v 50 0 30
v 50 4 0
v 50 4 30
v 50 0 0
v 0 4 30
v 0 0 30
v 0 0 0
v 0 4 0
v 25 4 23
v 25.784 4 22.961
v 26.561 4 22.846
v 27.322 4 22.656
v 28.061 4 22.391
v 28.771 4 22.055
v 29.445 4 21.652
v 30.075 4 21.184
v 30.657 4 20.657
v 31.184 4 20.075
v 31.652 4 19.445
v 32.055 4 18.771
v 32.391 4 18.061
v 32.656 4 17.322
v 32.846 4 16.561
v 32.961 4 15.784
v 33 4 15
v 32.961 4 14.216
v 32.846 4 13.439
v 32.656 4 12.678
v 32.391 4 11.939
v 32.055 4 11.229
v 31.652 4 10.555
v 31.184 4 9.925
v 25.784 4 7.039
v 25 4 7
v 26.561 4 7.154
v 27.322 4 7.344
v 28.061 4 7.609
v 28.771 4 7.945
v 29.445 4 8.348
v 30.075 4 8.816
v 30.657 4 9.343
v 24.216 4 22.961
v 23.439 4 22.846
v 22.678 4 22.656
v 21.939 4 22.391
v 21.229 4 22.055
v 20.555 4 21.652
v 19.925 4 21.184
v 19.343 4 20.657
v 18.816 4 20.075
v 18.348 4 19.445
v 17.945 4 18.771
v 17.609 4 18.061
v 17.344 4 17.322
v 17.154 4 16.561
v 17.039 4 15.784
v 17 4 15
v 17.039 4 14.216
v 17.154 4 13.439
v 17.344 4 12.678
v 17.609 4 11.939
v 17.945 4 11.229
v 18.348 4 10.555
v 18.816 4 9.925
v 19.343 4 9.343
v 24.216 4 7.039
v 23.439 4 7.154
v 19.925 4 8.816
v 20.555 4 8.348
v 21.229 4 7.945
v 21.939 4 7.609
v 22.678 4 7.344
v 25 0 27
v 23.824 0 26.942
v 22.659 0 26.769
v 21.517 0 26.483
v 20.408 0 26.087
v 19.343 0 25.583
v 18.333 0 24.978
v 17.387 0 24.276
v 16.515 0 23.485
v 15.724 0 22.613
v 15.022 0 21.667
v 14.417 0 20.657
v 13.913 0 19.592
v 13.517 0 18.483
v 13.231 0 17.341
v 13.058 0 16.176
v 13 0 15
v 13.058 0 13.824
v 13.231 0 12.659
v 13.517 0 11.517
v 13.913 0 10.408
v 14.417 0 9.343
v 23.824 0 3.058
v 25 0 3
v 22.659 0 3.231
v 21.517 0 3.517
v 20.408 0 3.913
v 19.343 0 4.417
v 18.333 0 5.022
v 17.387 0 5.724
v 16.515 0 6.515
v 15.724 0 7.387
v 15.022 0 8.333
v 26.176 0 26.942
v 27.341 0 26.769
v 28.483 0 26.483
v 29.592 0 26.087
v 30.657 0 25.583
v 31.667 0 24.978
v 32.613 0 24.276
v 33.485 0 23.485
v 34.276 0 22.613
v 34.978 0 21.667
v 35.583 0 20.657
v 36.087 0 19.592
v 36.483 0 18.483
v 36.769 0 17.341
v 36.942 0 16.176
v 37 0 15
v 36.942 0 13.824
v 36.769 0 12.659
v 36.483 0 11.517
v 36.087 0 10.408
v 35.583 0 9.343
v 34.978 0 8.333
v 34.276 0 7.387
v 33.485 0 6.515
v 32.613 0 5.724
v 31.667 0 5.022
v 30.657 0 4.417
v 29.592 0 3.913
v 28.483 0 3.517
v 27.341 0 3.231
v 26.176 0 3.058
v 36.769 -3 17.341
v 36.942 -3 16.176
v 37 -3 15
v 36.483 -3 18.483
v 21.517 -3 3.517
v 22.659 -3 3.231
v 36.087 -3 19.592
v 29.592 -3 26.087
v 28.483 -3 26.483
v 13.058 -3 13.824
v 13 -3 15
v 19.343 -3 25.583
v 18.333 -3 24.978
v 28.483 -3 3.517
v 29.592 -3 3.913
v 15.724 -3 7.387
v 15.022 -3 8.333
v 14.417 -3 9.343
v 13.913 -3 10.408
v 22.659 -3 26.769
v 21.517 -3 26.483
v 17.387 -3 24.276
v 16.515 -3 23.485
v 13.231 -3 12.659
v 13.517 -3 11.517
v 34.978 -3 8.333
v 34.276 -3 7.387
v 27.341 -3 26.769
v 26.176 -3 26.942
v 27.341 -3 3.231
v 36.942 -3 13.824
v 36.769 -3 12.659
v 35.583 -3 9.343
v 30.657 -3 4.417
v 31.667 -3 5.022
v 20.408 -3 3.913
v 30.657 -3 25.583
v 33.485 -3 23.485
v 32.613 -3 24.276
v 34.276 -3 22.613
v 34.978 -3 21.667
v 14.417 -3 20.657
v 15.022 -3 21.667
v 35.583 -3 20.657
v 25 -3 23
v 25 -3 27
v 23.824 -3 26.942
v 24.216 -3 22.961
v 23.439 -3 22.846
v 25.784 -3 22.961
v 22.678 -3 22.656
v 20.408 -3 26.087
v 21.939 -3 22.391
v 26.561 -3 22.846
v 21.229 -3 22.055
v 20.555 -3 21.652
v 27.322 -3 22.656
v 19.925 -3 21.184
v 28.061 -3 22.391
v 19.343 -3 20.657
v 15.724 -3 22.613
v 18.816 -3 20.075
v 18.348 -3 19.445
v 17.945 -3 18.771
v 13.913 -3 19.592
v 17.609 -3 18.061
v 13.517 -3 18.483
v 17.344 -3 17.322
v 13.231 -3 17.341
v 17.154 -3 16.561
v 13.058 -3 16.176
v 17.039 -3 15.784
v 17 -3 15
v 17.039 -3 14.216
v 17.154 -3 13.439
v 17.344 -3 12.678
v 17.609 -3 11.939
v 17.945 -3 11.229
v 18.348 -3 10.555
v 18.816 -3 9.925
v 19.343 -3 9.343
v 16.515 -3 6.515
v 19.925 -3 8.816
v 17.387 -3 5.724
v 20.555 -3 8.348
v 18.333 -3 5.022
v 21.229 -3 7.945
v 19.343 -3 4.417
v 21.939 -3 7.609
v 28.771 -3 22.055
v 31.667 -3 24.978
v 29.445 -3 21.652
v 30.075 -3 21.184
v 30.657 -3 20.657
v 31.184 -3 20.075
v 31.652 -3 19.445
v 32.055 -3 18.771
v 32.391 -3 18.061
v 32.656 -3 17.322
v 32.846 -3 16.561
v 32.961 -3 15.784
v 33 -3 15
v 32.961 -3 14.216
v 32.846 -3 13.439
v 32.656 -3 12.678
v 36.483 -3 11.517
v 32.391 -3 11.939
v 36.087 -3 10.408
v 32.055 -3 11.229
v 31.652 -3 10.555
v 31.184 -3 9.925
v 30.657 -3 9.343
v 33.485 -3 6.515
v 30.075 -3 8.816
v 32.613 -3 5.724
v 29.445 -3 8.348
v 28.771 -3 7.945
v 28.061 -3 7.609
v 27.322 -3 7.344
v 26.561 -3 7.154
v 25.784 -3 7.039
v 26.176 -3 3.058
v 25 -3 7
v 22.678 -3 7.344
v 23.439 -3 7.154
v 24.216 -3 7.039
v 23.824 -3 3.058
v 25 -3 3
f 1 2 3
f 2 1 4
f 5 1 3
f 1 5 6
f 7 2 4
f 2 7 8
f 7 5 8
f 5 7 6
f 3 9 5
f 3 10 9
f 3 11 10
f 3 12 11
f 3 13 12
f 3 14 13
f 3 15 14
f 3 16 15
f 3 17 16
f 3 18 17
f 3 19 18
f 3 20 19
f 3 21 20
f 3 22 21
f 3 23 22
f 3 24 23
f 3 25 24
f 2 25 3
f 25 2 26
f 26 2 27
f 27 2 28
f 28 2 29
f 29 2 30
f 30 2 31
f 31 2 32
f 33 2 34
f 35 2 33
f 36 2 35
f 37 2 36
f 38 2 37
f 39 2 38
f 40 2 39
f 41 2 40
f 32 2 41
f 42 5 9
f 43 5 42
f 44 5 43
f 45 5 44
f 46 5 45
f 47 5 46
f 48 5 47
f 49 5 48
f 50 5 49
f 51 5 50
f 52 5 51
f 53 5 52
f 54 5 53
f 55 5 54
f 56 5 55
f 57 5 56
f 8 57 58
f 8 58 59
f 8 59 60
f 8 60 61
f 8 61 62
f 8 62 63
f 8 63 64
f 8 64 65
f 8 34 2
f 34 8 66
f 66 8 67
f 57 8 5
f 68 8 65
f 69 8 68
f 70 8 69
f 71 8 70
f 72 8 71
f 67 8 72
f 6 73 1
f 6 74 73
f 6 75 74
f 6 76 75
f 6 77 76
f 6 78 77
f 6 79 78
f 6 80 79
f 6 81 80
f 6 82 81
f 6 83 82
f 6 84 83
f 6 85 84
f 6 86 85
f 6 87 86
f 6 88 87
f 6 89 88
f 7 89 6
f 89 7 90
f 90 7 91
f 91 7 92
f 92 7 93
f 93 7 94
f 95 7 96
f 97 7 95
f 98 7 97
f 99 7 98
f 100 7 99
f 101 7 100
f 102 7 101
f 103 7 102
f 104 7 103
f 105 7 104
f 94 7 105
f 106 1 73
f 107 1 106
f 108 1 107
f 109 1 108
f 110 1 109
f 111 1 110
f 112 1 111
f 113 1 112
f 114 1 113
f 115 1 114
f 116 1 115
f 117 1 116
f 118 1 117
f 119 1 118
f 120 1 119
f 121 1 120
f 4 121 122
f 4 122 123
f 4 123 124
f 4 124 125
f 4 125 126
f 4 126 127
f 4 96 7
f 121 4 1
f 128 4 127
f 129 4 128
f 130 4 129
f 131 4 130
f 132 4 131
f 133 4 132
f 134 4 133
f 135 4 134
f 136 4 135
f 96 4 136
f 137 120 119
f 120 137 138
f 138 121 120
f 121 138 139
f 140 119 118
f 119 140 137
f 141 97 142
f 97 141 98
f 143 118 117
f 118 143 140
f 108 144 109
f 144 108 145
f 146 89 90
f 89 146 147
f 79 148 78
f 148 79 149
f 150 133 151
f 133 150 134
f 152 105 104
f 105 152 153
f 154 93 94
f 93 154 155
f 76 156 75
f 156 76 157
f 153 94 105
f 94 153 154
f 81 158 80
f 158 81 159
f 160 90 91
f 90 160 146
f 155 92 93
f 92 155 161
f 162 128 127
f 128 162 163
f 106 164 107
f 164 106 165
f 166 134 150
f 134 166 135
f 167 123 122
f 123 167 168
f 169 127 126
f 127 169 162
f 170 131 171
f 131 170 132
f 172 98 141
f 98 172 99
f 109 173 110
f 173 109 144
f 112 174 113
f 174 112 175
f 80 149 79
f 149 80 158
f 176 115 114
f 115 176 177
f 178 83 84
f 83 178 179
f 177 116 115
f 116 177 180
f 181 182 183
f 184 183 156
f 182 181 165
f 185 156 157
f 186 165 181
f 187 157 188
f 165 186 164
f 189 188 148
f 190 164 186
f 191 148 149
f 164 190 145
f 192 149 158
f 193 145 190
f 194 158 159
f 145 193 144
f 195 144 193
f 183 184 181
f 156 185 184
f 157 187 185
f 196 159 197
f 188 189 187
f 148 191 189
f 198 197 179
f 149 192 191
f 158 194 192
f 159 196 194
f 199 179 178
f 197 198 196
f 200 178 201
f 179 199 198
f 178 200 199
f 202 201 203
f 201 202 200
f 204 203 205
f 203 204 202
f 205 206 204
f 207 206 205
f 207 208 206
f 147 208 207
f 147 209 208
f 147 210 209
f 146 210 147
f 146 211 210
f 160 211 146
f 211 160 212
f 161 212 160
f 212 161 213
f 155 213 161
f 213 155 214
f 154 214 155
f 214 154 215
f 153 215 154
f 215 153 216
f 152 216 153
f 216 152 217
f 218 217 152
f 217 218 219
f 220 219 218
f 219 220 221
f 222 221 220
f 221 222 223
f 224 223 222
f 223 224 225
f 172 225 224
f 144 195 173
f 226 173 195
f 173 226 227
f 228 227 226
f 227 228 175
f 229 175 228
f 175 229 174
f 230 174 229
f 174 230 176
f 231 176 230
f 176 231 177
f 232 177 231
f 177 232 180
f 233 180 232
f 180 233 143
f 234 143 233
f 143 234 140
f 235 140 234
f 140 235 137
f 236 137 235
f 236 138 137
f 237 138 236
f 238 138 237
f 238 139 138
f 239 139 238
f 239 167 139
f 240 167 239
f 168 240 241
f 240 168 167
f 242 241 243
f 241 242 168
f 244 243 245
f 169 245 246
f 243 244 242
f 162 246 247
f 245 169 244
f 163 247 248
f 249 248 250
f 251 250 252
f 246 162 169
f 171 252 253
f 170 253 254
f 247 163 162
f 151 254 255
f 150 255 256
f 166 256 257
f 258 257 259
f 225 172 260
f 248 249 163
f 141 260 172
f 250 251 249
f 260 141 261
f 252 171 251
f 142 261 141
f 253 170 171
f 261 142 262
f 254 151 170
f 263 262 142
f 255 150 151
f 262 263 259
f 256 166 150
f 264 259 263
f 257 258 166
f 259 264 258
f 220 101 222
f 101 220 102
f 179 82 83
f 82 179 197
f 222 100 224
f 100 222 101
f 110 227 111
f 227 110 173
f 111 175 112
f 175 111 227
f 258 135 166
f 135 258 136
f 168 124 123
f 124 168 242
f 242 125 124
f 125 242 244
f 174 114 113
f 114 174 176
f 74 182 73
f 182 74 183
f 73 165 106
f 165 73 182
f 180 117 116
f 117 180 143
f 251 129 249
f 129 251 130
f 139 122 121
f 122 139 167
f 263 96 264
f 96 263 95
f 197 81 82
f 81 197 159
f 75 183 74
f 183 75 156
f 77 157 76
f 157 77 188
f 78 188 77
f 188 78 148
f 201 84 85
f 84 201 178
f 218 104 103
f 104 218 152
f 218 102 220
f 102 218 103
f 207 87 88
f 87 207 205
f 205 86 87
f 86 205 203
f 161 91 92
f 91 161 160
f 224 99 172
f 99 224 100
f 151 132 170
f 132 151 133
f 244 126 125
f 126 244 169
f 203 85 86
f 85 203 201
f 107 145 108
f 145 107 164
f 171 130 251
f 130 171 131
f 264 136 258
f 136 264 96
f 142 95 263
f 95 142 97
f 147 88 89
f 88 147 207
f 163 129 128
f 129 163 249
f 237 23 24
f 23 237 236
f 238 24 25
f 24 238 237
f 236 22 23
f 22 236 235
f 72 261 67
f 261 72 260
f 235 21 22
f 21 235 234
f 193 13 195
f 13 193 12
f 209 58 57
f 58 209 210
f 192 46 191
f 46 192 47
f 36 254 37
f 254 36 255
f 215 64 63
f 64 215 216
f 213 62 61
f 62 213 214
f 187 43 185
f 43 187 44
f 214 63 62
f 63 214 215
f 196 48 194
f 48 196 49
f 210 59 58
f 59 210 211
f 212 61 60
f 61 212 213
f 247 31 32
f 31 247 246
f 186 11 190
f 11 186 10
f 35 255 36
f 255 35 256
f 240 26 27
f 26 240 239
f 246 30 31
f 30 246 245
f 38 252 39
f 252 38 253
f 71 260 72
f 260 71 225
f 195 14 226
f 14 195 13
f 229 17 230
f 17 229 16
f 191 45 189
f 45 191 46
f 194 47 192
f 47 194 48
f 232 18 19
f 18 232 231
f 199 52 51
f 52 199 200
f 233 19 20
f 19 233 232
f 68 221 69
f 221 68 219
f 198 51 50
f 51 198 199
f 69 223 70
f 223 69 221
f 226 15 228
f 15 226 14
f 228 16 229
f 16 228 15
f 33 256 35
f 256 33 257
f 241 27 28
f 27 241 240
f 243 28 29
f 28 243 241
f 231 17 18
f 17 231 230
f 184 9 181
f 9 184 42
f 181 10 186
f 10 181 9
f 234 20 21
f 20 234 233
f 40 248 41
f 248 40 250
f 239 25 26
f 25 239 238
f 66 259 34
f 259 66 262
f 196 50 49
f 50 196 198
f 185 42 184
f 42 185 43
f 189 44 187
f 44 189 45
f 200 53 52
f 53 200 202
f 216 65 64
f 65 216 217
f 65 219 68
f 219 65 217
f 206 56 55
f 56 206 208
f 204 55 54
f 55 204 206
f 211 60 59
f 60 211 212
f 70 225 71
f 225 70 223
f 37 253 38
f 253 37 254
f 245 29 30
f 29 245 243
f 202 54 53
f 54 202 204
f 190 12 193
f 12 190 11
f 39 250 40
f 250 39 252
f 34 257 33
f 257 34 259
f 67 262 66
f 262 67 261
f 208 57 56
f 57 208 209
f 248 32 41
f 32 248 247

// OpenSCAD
// Circular grommet/cable gland hole through a wall with reinforcing boss.

$fn = 64;

wall_width = 50;
wall_thickness = 4;
wall_height = 30;
hole_diameter = 16;
boss_outer_diameter = 24;
boss_projection = 3;
hole_center_z = wall_height / 2;

module wall_body() {
    cube([wall_width, wall_thickness, wall_height]);
}

module grommet_boss() {
    translate([wall_width / 2, 0, hole_center_z])
        rotate([90, 0, 0])
            cylinder(h = boss_projection, d = boss_outer_diameter);
}

module grommet_cut() {
    translate([wall_width / 2, wall_thickness / 2, hole_center_z])
        rotate([90, 0, 0])
            cylinder(h = wall_thickness + 2 * boss_projection + 2, d = hole_diameter, center = true);
}

difference() {
    union() {
        wall_body();
        grommet_boss();
    }
    grommet_cut();
}
